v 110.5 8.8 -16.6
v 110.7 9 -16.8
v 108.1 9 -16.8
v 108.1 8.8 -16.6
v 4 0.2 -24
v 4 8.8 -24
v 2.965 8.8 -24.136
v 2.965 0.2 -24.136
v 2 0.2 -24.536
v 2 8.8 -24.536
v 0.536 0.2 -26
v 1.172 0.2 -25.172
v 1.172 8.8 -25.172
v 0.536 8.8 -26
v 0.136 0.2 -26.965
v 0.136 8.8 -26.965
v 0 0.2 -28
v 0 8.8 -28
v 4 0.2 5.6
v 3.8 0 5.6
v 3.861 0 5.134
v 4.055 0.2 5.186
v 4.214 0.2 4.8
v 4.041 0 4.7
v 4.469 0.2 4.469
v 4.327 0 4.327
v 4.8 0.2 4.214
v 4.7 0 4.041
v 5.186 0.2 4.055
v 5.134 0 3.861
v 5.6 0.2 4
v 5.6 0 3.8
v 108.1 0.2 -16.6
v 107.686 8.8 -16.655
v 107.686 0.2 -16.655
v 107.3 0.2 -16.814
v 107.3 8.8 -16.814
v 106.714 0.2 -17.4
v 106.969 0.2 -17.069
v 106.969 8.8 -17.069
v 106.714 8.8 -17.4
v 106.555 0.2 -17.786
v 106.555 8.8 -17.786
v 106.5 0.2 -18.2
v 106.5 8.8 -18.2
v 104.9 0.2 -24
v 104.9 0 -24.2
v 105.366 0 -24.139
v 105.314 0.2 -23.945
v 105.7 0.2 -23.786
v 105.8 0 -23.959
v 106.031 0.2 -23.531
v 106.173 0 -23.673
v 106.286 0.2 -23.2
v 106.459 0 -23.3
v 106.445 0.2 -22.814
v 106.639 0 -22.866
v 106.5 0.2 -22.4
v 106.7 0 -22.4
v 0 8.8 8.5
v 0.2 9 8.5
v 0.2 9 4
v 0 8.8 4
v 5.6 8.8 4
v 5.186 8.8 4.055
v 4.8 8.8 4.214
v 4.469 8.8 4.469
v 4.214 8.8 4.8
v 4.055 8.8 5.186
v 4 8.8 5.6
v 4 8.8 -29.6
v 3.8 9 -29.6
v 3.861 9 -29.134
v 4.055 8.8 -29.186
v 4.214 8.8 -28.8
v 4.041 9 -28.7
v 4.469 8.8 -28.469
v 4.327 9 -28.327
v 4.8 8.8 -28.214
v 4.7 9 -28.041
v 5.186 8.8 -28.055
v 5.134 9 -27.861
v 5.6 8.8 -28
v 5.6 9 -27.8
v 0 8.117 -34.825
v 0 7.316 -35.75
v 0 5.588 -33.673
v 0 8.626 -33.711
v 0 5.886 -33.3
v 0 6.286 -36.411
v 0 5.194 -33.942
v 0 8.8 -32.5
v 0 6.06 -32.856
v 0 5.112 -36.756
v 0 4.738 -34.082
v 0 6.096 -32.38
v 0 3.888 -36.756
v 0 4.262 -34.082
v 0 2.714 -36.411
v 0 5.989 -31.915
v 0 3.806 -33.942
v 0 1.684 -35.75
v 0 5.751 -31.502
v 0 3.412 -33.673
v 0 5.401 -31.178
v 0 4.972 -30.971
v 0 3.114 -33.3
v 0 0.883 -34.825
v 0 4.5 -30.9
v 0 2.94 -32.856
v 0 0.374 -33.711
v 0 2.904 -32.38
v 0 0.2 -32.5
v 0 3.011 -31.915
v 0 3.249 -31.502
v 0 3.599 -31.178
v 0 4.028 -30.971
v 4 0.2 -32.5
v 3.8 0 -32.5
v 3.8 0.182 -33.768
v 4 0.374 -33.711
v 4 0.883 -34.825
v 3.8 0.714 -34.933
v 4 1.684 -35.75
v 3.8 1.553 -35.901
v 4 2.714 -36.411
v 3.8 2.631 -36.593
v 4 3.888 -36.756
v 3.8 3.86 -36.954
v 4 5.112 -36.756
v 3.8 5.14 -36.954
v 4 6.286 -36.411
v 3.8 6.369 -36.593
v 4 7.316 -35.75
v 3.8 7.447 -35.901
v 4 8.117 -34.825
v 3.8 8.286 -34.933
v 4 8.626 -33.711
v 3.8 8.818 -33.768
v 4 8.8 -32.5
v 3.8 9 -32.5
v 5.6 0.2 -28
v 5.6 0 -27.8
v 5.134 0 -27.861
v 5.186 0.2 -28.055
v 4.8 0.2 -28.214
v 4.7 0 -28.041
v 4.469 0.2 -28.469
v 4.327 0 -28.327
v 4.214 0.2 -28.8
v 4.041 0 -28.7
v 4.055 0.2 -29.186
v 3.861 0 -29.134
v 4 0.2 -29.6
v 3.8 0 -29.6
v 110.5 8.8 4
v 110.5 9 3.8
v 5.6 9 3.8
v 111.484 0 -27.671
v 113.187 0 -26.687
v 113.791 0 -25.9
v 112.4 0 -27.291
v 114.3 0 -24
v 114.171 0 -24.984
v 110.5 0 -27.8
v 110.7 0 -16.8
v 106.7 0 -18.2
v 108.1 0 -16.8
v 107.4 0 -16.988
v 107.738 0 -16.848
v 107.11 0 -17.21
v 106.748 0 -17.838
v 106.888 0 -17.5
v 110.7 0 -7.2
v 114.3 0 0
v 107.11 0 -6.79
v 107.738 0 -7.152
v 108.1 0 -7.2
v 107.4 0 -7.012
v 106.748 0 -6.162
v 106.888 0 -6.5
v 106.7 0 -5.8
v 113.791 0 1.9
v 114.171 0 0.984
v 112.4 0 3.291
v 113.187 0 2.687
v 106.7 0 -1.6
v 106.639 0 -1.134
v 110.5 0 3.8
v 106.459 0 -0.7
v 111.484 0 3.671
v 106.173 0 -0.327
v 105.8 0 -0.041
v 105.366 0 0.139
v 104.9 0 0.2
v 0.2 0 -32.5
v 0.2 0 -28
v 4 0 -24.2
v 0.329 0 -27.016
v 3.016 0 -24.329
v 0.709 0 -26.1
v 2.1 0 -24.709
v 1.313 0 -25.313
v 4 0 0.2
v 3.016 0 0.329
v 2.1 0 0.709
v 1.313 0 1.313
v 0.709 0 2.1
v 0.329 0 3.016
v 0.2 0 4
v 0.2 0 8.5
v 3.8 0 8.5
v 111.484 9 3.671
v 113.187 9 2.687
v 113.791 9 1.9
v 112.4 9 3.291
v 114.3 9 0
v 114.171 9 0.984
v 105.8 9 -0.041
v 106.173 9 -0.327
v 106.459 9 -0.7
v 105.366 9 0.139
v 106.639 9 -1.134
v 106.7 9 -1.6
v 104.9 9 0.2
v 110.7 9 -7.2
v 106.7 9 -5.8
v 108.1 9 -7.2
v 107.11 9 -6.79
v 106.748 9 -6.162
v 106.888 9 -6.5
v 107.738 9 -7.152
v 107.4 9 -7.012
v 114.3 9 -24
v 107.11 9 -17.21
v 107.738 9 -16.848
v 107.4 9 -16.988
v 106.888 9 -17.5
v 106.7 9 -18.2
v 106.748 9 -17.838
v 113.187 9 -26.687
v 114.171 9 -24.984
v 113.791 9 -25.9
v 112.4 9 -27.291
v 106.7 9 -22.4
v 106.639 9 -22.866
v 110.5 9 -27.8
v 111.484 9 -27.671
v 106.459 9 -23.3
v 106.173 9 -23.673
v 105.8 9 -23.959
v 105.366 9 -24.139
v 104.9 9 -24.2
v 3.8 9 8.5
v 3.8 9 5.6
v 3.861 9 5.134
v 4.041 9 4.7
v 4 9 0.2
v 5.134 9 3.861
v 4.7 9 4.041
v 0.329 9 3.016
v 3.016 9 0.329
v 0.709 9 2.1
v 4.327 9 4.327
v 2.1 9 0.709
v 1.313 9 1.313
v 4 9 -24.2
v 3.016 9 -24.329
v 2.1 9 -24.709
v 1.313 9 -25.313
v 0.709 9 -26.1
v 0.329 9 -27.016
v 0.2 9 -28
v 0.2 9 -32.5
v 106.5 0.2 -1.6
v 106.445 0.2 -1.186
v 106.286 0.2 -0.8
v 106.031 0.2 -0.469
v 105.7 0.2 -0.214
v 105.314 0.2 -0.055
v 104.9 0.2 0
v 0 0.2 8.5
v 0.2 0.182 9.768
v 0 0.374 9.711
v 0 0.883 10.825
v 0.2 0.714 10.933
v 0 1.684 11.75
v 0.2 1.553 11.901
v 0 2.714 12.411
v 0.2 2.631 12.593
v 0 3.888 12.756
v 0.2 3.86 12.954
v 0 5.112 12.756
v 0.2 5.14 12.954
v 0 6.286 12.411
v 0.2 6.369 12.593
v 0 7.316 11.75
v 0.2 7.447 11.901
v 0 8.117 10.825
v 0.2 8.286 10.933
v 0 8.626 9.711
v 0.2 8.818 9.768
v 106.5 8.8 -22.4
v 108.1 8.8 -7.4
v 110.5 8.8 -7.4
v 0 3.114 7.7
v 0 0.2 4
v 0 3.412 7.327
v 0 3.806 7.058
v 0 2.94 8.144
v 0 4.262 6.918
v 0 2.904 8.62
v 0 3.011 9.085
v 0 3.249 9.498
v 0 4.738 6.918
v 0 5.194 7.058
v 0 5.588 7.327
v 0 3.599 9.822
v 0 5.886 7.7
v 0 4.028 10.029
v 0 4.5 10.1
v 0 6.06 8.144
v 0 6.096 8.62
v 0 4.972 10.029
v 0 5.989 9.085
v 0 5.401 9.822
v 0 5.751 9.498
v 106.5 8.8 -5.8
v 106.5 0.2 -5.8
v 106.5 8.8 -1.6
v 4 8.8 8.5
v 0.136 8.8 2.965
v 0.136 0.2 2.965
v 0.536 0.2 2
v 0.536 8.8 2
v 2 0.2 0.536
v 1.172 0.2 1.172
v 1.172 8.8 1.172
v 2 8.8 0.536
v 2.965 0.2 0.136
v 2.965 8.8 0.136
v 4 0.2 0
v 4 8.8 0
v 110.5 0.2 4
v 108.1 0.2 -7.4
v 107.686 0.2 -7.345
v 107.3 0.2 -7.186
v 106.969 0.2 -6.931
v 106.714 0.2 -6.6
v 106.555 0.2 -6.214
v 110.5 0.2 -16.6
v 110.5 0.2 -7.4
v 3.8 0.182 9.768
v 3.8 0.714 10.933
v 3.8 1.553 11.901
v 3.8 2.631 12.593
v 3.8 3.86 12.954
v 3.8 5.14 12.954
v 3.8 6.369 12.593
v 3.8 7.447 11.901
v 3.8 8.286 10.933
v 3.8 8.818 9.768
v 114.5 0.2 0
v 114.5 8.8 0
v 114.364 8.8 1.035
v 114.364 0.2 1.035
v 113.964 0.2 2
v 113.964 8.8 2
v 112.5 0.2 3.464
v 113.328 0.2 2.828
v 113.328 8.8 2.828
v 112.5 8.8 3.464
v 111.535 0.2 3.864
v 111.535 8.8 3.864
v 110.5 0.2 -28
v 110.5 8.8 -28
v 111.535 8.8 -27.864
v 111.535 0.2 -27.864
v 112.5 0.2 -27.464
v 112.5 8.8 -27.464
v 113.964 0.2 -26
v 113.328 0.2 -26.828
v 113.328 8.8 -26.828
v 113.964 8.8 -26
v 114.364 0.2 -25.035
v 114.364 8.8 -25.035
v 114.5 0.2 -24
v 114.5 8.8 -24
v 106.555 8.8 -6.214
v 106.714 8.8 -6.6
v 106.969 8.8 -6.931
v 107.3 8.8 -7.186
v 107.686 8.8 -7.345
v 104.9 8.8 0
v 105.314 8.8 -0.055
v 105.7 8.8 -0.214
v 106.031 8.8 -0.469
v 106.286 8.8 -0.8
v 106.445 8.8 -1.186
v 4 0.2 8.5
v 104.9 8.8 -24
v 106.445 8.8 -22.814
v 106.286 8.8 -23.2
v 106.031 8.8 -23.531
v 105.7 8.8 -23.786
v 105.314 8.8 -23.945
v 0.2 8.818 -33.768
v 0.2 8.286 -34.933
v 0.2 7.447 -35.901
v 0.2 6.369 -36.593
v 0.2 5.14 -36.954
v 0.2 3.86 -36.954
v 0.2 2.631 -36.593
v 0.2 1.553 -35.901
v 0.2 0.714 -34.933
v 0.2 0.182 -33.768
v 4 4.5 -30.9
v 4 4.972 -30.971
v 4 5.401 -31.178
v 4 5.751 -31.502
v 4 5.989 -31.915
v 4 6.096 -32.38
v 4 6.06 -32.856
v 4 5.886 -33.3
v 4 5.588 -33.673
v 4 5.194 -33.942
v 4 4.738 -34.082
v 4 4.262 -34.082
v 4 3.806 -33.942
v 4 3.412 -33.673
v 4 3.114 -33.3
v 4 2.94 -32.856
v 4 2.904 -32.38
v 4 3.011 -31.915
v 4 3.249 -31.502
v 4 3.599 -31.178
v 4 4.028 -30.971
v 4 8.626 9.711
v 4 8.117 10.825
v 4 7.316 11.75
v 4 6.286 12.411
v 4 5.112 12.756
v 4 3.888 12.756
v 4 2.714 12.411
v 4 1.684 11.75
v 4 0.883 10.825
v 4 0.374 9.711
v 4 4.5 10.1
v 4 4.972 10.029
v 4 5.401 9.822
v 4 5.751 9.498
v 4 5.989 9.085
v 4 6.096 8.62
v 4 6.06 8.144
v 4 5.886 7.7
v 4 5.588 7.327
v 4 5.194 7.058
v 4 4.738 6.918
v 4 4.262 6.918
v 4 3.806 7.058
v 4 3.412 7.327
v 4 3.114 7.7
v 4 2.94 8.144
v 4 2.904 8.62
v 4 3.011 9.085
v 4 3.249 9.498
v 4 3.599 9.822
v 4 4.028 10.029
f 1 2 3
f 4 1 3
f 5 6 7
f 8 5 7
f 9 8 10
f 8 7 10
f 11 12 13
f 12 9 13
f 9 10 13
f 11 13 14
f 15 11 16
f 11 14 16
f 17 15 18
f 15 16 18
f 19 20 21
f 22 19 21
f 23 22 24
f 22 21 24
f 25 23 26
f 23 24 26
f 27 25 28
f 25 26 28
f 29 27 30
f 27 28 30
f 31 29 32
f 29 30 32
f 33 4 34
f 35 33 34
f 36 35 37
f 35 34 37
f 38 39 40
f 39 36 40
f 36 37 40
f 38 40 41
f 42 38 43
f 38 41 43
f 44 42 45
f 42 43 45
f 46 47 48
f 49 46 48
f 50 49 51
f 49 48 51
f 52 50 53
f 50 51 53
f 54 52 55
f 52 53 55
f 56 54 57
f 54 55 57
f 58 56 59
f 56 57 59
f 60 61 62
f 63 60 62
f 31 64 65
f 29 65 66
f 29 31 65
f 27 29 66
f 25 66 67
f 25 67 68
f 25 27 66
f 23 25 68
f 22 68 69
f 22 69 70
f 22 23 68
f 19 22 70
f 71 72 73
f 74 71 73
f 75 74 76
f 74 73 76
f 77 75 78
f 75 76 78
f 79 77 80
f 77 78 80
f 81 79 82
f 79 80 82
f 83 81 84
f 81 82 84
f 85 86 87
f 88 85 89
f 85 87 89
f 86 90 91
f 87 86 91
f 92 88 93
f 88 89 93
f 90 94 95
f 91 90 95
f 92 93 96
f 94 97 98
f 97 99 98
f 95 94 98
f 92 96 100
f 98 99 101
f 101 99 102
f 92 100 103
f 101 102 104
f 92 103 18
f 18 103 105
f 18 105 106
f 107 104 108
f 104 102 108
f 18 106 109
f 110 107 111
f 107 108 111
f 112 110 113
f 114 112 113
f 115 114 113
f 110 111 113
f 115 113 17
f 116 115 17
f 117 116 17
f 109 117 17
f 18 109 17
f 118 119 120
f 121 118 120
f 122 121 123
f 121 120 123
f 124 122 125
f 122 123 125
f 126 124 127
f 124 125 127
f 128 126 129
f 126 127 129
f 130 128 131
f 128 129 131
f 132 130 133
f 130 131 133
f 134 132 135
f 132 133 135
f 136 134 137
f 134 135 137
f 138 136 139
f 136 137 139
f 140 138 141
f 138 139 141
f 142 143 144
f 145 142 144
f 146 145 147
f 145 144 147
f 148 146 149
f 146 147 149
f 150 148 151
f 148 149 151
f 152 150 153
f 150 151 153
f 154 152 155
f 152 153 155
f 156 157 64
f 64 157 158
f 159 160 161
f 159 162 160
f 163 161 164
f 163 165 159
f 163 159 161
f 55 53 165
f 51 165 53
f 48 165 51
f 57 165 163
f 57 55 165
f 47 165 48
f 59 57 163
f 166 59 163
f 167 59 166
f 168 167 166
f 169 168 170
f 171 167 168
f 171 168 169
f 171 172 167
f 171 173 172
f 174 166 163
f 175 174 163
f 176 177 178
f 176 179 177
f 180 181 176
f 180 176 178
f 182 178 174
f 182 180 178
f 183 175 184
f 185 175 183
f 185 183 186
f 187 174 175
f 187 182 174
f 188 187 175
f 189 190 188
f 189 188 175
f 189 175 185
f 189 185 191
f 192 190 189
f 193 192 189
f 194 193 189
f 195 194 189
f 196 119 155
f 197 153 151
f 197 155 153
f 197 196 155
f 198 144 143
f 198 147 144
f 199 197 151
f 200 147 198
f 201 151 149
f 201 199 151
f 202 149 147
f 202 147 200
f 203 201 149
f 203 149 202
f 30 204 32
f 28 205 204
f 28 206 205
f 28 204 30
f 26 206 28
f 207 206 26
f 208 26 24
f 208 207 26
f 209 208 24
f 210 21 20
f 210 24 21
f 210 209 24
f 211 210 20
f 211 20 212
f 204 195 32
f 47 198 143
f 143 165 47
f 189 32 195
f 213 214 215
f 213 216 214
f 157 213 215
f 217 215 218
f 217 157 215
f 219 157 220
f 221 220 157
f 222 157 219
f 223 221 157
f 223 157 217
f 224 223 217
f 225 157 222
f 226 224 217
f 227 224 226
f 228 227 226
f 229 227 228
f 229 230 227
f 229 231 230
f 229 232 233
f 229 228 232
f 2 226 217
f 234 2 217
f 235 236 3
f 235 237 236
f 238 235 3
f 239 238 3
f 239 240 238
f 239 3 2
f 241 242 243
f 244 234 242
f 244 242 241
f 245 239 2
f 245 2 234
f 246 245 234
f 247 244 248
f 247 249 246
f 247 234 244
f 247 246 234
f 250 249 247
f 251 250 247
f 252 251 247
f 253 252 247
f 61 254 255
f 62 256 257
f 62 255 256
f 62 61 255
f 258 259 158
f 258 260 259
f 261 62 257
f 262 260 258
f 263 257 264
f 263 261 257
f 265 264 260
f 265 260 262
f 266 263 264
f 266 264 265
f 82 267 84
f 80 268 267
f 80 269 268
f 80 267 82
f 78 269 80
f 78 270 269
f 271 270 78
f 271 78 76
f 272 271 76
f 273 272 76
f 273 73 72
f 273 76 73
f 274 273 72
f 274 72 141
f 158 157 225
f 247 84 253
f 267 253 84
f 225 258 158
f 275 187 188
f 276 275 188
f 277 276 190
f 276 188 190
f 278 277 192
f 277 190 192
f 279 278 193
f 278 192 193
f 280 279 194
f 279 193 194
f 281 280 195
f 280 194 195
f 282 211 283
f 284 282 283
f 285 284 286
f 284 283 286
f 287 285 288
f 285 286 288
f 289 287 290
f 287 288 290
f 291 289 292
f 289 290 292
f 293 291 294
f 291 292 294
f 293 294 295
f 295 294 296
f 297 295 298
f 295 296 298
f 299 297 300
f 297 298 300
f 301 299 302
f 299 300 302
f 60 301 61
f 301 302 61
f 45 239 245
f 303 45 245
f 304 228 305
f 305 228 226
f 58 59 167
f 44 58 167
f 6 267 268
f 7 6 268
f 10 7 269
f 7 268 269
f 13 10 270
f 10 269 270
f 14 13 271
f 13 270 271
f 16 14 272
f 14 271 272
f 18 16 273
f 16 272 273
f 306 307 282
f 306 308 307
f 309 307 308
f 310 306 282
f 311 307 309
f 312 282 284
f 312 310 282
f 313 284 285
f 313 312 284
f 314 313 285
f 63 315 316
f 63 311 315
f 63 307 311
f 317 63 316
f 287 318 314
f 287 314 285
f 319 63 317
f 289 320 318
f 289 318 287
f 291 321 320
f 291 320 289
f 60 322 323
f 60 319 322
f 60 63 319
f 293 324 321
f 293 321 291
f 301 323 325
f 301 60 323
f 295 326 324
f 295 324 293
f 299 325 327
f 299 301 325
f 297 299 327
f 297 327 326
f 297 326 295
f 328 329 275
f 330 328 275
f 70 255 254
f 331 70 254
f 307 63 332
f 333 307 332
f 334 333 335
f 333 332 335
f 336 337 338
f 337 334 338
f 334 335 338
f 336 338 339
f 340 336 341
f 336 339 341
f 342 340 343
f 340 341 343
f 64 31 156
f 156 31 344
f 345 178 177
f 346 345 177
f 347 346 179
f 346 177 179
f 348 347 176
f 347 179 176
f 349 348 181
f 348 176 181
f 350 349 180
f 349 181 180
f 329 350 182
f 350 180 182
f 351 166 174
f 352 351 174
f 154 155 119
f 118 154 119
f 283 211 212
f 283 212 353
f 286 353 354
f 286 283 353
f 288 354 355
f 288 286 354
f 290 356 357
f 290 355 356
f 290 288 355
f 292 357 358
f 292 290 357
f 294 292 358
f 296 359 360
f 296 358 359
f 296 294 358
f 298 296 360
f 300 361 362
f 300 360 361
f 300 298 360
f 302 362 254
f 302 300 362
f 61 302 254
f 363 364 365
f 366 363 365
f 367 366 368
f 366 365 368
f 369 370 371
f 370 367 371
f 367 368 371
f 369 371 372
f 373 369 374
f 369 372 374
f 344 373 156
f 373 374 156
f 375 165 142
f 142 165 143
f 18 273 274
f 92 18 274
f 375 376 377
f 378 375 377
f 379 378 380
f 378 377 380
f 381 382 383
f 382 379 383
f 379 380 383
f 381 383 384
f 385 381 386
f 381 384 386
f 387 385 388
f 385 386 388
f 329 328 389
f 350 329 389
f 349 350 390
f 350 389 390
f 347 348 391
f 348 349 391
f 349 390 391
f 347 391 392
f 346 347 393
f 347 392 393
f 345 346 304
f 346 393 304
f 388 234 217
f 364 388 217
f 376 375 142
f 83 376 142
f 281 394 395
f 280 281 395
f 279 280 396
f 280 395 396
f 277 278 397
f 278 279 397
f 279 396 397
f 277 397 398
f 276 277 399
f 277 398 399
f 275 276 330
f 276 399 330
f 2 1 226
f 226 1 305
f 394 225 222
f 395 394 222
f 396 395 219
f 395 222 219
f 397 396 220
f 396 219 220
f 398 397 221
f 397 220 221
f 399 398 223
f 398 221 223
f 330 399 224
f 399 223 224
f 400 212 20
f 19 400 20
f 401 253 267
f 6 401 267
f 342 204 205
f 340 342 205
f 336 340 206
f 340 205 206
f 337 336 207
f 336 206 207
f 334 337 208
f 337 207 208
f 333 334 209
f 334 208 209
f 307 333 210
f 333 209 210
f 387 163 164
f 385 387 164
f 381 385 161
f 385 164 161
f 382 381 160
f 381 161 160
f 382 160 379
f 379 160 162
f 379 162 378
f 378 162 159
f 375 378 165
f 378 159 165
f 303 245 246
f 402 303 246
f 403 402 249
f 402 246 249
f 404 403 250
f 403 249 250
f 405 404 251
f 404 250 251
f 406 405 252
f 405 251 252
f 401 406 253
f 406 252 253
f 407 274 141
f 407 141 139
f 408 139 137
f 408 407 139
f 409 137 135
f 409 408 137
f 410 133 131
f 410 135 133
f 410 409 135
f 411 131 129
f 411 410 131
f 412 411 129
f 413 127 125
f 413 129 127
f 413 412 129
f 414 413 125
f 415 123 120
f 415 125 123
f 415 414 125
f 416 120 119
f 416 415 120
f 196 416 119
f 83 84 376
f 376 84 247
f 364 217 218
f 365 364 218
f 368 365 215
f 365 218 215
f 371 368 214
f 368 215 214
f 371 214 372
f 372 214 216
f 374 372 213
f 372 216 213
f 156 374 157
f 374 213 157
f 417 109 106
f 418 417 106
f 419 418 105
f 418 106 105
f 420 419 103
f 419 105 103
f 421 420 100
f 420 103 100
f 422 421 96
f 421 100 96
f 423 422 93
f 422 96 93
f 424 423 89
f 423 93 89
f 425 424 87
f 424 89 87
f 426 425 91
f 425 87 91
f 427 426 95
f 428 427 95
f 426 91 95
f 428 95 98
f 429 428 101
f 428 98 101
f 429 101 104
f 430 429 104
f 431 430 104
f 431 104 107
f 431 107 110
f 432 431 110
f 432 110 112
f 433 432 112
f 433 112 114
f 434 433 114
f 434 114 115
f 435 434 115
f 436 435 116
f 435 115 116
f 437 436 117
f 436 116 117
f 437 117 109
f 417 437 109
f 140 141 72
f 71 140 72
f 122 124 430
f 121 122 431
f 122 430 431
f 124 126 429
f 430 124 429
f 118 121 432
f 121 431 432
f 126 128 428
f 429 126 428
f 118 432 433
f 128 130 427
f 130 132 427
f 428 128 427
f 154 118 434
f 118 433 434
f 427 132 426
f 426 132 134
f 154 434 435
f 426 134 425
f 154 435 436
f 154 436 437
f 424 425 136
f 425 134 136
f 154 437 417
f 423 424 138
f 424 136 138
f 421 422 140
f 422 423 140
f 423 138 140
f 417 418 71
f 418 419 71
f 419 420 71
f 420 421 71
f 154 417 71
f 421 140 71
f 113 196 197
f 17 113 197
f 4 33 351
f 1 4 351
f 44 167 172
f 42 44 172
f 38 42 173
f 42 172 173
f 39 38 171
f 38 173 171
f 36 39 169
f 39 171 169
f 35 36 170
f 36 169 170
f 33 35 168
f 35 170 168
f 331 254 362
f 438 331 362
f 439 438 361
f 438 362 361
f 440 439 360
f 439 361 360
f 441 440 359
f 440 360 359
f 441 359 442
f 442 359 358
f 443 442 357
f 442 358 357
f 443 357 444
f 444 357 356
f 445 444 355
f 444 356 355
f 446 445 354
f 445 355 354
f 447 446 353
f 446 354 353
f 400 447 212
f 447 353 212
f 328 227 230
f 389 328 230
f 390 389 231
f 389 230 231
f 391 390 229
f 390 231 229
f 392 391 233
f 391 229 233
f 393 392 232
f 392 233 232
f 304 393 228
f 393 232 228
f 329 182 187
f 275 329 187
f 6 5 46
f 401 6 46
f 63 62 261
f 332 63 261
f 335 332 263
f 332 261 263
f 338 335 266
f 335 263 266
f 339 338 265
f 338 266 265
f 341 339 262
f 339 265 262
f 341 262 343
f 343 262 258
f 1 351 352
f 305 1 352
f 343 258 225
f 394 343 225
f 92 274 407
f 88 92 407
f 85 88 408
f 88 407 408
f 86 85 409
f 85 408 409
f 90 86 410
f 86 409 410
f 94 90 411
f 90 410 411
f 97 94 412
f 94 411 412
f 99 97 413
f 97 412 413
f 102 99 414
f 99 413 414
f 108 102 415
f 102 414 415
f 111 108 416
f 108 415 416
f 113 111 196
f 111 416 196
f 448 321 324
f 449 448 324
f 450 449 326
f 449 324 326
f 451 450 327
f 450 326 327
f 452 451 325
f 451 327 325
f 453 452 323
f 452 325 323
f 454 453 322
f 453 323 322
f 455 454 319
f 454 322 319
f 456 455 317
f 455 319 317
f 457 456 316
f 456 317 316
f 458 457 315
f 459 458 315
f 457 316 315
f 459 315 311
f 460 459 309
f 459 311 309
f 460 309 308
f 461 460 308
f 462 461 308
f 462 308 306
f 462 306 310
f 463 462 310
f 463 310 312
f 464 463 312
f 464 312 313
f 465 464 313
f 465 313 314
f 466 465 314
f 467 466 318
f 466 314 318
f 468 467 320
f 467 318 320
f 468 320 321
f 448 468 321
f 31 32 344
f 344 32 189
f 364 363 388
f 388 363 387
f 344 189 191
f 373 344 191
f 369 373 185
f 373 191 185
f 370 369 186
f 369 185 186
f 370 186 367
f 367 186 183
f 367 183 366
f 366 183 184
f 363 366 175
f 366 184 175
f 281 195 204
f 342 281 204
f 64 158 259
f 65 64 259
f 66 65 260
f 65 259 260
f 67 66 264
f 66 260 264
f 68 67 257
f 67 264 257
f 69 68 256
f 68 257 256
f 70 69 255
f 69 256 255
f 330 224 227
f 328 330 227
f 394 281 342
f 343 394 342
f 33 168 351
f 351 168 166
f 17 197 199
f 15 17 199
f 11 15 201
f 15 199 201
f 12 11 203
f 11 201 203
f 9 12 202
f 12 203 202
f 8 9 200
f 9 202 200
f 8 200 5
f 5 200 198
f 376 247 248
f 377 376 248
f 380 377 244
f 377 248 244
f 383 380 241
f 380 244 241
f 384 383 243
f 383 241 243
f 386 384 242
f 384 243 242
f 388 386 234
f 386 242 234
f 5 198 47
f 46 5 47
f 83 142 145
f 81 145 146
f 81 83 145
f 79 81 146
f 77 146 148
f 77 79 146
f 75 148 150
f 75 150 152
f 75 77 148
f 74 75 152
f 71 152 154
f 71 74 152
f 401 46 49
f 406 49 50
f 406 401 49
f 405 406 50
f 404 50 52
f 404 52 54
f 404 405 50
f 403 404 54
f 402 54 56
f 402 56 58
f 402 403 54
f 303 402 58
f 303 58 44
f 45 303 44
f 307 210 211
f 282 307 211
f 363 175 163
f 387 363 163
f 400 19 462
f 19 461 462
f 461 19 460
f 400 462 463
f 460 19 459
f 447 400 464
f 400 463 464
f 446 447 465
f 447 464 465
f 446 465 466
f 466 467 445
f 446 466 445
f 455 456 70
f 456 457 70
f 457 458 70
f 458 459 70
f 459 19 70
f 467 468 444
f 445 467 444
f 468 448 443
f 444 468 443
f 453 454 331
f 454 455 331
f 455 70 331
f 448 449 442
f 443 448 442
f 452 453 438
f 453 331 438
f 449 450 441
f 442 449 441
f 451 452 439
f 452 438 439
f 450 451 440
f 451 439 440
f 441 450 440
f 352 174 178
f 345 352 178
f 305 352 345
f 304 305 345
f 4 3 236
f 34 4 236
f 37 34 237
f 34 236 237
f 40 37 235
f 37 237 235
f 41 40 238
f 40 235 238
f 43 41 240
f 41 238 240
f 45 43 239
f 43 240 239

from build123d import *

# Parameters (mm, degrees)
EXTRUDE_1_DEPTH = 9
SKETCH_2_R      = 1.6
EXTRUDE_2_DEPTH = 4
FILLET_1_R      = 4
FILLET_2_R      = 1.6
CHAMFER_1_SIZE  = 0.2


with BuildPart() as part:
    # 草图1 → 凸台-拉伸1 (new body)
    with BuildSketch(Plane(origin=(0, 0, 0), x_dir=(1, 0, 0), z_dir=(0, 1, 0))):
        Polygon((106.5, 0), (0, 0), (0, -4), (114.5, -4), (114.5, 28), (0, 28), (0, 24), (106.5, 24), (106.5, 16.6), (110.5, 16.6), (110.5, 7.4), (106.5, 7.4), align=None)
    extrude(amount=EXTRUDE_1_DEPTH)

    # 草图2 → 凸台-拉伸2 (add)
    # profile 1 of 2: a face of its own
    with BuildSketch(Plane.ZY):
        with BuildLine():
            Line((8.5, 9), (4, 9))
            Line((4, 9), (4, 0))
            Line((4, 0), (8.5, 0))
            ThreePointArc((8.5, 0), (13, 4.5), (8.5, 9))
        make_face()
        with Locations((8.5, 4.5)):
            Circle(SKETCH_2_R, mode=Mode.SUBTRACT)
    # profile 2 of 2: a face of its own
    with BuildSketch(Plane.ZY):
        with BuildLine():
            Line((-28, 0), (-28, 9))
            Line((-28, 9), (-32.5, 9))
            ThreePointArc((-32.5, 9), (-37, 4.5), (-32.5, 0))
            Line((-32.5, 0), (-28, 0))
        make_face()
        with Locations((-32.5, 4.5)):
            Circle(SKETCH_2_R, mode=Mode.SUBTRACT)
    extrude(amount=-EXTRUDE_2_DEPTH)

    # 圆角1
    fillet_1_edges = [part.edges().sort_by_distance(p)[0] for p in [
        (0, 4.5, -24),
        (114.5, 4.5, -28),
        (114.5, 4.5, 4),
        (0, 4.5, 0),
    ]]
    fillet(fillet_1_edges, radius=FILLET_1_R)

    # 圆角2
    fillet_2_edges = [part.edges().sort_by_distance(p)[0] for p in [
        (106.5, 4.5, -16.6),
        (106.5, 4.5, -24),
        (106.5, 4.5, 0),
        (106.5, 4.5, -7.4),
        (4, 4.5, -28),
        (4, 4.5, 4),
    ]]
    fillet(fillet_2_edges, radius=FILLET_2_R)

    # 倒角1
    chamfer_1_edges = [part.edges().sort_by_distance(p)[0] for p in [
        (106.5, 0, -3.7),
        (106.5, 9, -3.7),
        (58.05, 0, -28),
        (58.05, 0, 4),
        (54.45, 0, 0),
        (106.5, 0, -20.3),
        (106.96862915, 0, -17.06862915),
        (106.96862915, 0, -6.93137085),
        (58.05, 9, -28),
        (4, 9, -31.05),
        (106.5, 9, -20.3),
        (54.45, 9, 0),
        (4, 9, 7.05),
        (58.05, 9, 4),
        (106.96862915, 9, -17.06862915),
        (106.96862915, 9, -6.93137085),
        (109.3, 9, -7.4),
        (106.03137085, 0, -0.46862915),
        (106.03137085, 9, -0.46862915),
        (4.46862915, 9, 4.46862915),
        (4.46862915, 0, 4.46862915),
        (4.46862915, 0, -28.46862915),
        (4.46862915, 9, -28.46862915),
        (106.03137085, 0, -23.53137085),
        (106.03137085, 9, -23.53137085),
        (109.3, 0, -7.4),
        (110.5, 0, -12),
        (109.3, 0, -16.6),
        (109.3, 9, -16.6),
        (0, 4.5, -37),
        (4, 0, -31.05),
        (4, 4.5, -37),
        (4, 4.5, 13),
        (4, 0, 7.05),
        (0, 4.5, 13),
        (54.45, 0, -24),
        (0, 0, -30.25),
        (114.5, 0, -12),
        (0, 0, 6.25),
        (1.171572875, 0, -25.171572875),
        (1.171572875, 0, 1.171572875),
        (113.328427125, 0, 2.828427125),
        (113.328427125, 0, -26.828427125),
        (114.5, 9, -12),
        (110.5, 9, -12),
        (0, 9, 6.25),
        (0, 9, -30.25),
        (54.45, 9, -24),
        (1.171572875, 9, -25.171572875),
        (1.171572875, 9, 1.171572875),
        (113.328427125, 9, 2.828427125),
        (113.328427125, 9, -26.828427125),
    ]]
    chamfer(chamfer_1_edges, length=CHAMFER_1_SIZE)


solid = part.part
